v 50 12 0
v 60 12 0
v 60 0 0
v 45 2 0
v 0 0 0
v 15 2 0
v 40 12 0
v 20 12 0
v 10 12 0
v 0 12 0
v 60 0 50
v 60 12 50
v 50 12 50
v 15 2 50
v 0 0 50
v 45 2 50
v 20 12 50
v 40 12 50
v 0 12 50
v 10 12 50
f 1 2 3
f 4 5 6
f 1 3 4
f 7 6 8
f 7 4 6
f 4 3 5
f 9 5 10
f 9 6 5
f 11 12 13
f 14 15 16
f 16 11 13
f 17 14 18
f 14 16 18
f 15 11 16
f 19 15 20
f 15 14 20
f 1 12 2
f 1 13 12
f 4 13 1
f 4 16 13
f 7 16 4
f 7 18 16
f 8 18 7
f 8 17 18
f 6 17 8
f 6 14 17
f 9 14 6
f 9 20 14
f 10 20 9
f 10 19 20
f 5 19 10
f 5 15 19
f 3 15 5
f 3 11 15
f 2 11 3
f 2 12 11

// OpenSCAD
$fn = 32;

// ----------------------------------------------------------------------
// V guide rail: doublev, 60 mm wide
// ----------------------------------------------------------------------

// --- parameters (mm) ---
rail_w = 60;              // rail width, X
base_t = 12;              // base plate thickness
v_depth = 10;             // V feature depth / height
v_half_w = 10;            // half width of the V at the base face
plate_t = 50;             // rail length, Z (the extrusion height)
groove_off = 15;          // offset of each groove from the centreline

centre_x = rail_w / 2;  // rail centreline
groove_a = centre_x - groove_off;  // axis of the first groove
groove_b = centre_x + groove_off;  // axis of the second groove

profile = [[0, 0], [60, 0], [60, 12], [50, 12], [45, 2], [40, 12], [20, 12], [15, 2], [10, 12], [0, 12]];  // primary outline, 10 points, counter clockwise

// --- the one profile operation ---
linear_extrude(height = plate_t) polygon(points = profile);
